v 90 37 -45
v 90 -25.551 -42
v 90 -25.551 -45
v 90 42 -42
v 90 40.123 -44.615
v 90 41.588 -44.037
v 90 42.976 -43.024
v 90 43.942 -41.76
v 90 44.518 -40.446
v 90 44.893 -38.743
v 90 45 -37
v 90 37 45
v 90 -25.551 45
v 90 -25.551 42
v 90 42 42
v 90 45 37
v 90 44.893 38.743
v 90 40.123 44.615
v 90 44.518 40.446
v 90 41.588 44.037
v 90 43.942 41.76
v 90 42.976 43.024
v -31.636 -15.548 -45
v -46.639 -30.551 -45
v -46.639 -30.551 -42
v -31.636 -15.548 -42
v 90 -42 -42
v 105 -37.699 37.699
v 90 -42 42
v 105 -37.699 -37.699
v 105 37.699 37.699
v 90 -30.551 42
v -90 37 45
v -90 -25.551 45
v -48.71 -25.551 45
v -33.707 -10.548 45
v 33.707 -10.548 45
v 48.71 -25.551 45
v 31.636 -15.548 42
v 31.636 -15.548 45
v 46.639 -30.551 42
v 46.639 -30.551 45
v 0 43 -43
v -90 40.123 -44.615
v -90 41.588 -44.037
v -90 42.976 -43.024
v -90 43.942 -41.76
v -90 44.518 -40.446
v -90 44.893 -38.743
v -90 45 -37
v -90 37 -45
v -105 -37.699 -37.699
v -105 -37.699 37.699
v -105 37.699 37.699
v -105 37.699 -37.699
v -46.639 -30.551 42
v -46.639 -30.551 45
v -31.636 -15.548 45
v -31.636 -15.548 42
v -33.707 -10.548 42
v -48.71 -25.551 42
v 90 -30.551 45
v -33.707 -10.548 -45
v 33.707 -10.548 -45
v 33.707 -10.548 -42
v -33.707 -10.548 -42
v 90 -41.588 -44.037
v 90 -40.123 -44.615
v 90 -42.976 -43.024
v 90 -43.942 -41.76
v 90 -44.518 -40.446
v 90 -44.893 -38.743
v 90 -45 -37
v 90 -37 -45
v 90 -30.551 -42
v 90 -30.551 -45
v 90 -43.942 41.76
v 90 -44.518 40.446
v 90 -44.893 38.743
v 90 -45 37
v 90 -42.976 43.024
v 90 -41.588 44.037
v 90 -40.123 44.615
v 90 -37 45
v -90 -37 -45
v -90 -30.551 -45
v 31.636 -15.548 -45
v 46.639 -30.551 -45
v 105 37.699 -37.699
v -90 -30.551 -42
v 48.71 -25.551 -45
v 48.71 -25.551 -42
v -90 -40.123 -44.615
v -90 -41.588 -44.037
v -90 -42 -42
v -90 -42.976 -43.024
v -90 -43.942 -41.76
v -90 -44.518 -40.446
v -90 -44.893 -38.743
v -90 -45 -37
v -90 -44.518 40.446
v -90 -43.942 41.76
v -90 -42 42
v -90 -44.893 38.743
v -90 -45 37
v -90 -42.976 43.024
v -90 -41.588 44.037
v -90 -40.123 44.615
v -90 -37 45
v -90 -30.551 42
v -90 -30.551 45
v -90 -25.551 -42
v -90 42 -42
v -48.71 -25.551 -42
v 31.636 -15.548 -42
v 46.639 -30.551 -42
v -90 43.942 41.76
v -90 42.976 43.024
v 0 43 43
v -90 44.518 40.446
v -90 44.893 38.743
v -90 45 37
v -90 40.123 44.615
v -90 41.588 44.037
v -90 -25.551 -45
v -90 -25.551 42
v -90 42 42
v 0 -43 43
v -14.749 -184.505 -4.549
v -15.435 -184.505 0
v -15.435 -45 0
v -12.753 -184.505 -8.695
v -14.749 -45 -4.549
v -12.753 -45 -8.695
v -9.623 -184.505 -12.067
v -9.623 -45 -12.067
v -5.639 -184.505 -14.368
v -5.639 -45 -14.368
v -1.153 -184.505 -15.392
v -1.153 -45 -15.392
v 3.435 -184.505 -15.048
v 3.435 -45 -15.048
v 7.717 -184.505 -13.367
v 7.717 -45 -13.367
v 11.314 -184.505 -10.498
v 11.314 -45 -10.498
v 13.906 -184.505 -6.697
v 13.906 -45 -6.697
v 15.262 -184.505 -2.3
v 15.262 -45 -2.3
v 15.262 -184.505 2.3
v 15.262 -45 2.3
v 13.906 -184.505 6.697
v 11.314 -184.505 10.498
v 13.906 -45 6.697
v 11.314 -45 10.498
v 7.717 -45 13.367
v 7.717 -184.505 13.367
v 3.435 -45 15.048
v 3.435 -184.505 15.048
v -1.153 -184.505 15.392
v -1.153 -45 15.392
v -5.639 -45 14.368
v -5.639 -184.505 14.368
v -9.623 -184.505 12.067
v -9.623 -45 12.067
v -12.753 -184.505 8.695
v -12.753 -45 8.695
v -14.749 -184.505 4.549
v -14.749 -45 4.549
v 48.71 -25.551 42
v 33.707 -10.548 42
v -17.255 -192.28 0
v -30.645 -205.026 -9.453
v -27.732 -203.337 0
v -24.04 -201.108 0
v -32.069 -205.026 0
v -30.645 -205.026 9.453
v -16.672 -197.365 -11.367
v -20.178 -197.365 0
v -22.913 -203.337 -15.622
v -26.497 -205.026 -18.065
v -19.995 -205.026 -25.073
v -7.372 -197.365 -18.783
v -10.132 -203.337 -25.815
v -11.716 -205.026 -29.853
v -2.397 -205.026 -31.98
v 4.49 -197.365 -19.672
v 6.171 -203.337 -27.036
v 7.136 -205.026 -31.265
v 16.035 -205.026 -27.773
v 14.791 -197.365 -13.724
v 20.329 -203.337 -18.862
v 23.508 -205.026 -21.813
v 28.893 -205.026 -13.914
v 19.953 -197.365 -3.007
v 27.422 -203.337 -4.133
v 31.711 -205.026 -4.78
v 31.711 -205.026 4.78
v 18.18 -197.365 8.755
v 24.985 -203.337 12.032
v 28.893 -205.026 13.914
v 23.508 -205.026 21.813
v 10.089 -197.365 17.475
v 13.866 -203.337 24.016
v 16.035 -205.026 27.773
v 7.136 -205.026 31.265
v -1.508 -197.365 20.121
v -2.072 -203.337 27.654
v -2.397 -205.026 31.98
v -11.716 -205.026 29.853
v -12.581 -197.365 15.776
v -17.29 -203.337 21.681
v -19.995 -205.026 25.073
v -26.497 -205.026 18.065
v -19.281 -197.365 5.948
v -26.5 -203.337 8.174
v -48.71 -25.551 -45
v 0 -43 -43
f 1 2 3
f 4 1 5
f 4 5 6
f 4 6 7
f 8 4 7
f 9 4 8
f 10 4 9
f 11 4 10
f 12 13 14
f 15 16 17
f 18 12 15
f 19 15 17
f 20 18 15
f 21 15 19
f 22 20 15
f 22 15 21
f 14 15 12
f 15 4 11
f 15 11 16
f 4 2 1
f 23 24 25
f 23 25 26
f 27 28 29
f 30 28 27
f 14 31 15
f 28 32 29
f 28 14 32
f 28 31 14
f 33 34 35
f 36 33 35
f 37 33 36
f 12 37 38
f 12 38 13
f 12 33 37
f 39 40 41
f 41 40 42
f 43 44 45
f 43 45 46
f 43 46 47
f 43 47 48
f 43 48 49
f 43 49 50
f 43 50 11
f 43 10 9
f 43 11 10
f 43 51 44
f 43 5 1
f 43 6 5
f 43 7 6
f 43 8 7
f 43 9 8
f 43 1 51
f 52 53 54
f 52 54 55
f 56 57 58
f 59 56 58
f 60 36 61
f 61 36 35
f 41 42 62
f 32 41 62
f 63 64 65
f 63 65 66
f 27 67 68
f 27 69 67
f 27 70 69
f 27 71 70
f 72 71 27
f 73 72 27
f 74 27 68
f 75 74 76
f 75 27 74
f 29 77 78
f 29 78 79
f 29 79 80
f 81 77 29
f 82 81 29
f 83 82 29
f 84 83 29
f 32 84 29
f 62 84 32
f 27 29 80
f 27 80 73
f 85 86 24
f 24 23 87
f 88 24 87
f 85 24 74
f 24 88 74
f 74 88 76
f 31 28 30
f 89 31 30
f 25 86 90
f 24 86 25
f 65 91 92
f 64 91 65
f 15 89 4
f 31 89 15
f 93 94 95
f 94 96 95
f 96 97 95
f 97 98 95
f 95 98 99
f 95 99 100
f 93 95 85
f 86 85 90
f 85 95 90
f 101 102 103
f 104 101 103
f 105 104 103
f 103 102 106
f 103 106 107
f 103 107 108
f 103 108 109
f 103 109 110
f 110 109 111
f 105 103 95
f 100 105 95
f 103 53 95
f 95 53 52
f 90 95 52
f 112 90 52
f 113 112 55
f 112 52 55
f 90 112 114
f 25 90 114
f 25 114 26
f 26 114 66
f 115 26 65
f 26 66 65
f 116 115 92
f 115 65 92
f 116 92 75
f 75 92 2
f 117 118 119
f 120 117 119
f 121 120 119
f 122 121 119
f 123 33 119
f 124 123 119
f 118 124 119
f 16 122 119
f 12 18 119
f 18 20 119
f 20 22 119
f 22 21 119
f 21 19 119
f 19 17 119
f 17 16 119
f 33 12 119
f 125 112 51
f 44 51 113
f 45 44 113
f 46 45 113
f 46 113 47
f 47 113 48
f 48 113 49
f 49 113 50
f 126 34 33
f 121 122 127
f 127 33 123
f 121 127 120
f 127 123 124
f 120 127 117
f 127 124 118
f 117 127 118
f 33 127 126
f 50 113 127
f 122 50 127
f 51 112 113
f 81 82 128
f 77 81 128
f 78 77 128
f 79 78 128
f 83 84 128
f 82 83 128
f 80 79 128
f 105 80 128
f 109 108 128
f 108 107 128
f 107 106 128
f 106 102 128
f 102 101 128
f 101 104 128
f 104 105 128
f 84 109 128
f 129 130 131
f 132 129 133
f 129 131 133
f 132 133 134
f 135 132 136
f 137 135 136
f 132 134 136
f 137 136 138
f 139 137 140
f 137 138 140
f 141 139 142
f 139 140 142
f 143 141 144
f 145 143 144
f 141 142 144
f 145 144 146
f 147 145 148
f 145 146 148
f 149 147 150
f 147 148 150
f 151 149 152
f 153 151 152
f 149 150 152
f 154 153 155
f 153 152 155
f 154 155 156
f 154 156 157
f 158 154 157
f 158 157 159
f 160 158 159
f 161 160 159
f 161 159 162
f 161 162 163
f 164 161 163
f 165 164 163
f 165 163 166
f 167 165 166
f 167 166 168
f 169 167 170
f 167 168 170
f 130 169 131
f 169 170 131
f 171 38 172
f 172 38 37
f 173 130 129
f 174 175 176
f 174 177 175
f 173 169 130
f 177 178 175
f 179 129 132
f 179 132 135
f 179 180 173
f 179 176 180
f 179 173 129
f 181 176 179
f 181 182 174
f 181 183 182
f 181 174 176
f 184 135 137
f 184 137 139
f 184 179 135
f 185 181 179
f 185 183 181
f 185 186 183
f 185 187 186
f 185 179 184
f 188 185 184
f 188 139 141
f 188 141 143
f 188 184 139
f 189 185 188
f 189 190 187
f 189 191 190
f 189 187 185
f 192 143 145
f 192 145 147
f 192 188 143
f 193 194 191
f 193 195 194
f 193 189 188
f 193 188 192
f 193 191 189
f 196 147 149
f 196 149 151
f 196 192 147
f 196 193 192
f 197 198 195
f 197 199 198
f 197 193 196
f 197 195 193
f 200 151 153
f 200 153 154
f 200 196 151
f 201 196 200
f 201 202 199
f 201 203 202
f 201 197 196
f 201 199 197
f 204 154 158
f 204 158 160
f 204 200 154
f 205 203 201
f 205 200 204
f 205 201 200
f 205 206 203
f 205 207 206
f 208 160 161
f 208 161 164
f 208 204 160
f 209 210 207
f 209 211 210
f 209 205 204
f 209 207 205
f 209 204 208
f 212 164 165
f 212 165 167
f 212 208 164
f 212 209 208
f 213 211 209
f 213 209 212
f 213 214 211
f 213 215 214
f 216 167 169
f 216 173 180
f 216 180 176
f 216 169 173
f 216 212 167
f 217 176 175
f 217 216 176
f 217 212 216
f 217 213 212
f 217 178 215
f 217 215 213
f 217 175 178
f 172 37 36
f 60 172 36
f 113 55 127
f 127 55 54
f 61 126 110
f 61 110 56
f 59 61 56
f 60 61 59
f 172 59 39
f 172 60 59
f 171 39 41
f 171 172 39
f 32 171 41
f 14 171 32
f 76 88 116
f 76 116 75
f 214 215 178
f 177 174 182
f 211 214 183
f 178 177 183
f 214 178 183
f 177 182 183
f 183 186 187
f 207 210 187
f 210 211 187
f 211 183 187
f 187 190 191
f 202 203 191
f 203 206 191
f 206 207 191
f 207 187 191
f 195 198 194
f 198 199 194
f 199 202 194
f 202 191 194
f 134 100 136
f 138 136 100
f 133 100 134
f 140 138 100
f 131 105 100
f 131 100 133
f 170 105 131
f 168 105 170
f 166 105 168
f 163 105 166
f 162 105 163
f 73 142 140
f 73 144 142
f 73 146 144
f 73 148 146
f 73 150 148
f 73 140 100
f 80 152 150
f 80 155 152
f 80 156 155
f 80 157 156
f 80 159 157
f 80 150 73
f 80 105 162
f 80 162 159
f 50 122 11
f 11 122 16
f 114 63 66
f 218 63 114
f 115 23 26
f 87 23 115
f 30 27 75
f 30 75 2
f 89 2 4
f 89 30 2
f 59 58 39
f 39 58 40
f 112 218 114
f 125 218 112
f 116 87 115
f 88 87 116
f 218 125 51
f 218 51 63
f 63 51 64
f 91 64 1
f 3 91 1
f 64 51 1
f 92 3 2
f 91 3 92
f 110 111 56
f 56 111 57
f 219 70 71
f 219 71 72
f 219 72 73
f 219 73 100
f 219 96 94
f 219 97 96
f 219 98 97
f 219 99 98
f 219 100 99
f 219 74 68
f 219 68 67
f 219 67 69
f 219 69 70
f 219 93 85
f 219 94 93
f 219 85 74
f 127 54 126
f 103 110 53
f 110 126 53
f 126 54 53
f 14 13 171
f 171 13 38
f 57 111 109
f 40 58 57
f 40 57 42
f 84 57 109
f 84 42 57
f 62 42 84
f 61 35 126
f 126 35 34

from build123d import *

# Parameters (mm, degrees)
SKETCH_1_W          = 180
SKETCH_1_H          = 90
EXTRUDE_1_DEPTH     = 45
SKETCH_3_W          = 84
SKETCH_3_H          = 84
EXTRUDE_3_DEPTH     = 15
EXTRUDE_3_TAPER     = 16
CUT_EXTRUDE_1_DEPTH = 3
FILLET_1_SIZE       = 8


with BuildPart() as part:
    # 草图1 → 凸台-拉伸1 (new, symmetric)
    with BuildSketch(Plane.XY):
        Rectangle(SKETCH_1_W, SKETCH_1_H)
    extrude(amount=EXTRUDE_1_DEPTH, both=True)

    # 草图3 → 凸台-拉伸3 (add)
    with BuildSketch(Plane(origin=(90, 0, 0), x_dir=(0, 0, -1), z_dir=(1, 0, 0))):
        Rectangle(SKETCH_3_W, SKETCH_3_H)
    extrude_3 = extrude(amount=EXTRUDE_3_DEPTH, taper=EXTRUDE_3_TAPER)

    # 镜向2: 凸台-拉伸3 across plane
    add(extrude_3.mirror(Plane(origin=(0, 0, 0), x_dir=(0, 0, 1), z_dir=(1, 0, 0))))

    # 草图5 → 切除-拉伸1 (cut)
    with BuildSketch(Plane(origin=(0, 0, -45), x_dir=(-1, 0, 0), z_dir=(0, 0, -1))):
        Polygon((-90, -25.551009309), (-48.710009236, -25.551009309), (-33.70706091, -10.548060984), (33.70706091, -10.548060984), (48.710009236, -25.551009309), (90, -25.551009309), (90, -30.551009309), (46.638941424, -30.551009309), (31.635993099, -15.548060984), (-31.635993099, -15.548060984), (-46.638941424, -30.551009309), (-90, -30.551009309), align=None)
    cut_extrude_1 = extrude(amount=-CUT_EXTRUDE_1_DEPTH, mode=Mode.SUBTRACT)

    # 镜向3: 切除-拉伸1 across plane
    add(cut_extrude_1.mirror(Plane.XY), mode=Mode.SUBTRACT)

    # 圆角1
    # a fillet whose section is not a circle: 8 mm, written as the material it takes off along each edge
    with BuildSketch(Plane(origin=(110, -45, -45), x_dir=(0, 0, 1), z_dir=(-1, 0, 0)), Plane(origin=(-110, 45, -45), x_dir=(0, 0, 1), z_dir=(1, 0, 0))) as fillet_1_piece_1:
        with BuildLine():
            Bezier((FILLET_1_SIZE, 0), (0, 0), (0, FILLET_1_SIZE), weights=[1, 1, 1])
            Line((0, FILLET_1_SIZE), (0, 0))
            Line((0, 0), (FILLET_1_SIZE, 0))
        make_face()
    extrude(amount=220, mode=Mode.SUBTRACT)
    with BuildSketch(Plane(origin=(-110, 45, 45), x_dir=(0, 0, -1), z_dir=(1, 0, 0)), Plane(origin=(110, -45, 45), x_dir=(0, 0, -1), z_dir=(-1, 0, 0))) as fillet_1_piece_2:
        with BuildLine():
            Bezier((FILLET_1_SIZE, 0), (0, 0), (0, -FILLET_1_SIZE), weights=[1, 1, 1])
            Line((0, -FILLET_1_SIZE), (0, 0))
            Line((0, 0), (FILLET_1_SIZE, 0))
        make_face()
    extrude(amount=220, mode=Mode.SUBTRACT)

    # 草图16 → 旋转1 (revolve)
    with BuildSketch(Plane.XY, mode=Mode.PRIVATE) as revolve_1_sk:
        with BuildLine():
            Line((0, -45), (0, -205.026171576))
            Line((0, -205.026171576), (32.069336895, -205.026171576))
            add(Edge.make_bspline(
                [(15.434694719, -184.505349345), (16.976260644, -200.431842868), (32.069336895, -205.026171576)],
                knots=[0, 0, 0, 1, 1, 1], degree=2))
            Line((15.434694719, -184.505349345), (15.434694719, -45))
            Line((15.434694719, -45), (0, -45))
        make_face()
    revolve(revolve_1_sk.sketch.rotate(Axis((0, -45, 0), (0, -1, 0)), 180), axis=Axis((0, -45, 0), (0, -1, 0)))


solid = part.part
